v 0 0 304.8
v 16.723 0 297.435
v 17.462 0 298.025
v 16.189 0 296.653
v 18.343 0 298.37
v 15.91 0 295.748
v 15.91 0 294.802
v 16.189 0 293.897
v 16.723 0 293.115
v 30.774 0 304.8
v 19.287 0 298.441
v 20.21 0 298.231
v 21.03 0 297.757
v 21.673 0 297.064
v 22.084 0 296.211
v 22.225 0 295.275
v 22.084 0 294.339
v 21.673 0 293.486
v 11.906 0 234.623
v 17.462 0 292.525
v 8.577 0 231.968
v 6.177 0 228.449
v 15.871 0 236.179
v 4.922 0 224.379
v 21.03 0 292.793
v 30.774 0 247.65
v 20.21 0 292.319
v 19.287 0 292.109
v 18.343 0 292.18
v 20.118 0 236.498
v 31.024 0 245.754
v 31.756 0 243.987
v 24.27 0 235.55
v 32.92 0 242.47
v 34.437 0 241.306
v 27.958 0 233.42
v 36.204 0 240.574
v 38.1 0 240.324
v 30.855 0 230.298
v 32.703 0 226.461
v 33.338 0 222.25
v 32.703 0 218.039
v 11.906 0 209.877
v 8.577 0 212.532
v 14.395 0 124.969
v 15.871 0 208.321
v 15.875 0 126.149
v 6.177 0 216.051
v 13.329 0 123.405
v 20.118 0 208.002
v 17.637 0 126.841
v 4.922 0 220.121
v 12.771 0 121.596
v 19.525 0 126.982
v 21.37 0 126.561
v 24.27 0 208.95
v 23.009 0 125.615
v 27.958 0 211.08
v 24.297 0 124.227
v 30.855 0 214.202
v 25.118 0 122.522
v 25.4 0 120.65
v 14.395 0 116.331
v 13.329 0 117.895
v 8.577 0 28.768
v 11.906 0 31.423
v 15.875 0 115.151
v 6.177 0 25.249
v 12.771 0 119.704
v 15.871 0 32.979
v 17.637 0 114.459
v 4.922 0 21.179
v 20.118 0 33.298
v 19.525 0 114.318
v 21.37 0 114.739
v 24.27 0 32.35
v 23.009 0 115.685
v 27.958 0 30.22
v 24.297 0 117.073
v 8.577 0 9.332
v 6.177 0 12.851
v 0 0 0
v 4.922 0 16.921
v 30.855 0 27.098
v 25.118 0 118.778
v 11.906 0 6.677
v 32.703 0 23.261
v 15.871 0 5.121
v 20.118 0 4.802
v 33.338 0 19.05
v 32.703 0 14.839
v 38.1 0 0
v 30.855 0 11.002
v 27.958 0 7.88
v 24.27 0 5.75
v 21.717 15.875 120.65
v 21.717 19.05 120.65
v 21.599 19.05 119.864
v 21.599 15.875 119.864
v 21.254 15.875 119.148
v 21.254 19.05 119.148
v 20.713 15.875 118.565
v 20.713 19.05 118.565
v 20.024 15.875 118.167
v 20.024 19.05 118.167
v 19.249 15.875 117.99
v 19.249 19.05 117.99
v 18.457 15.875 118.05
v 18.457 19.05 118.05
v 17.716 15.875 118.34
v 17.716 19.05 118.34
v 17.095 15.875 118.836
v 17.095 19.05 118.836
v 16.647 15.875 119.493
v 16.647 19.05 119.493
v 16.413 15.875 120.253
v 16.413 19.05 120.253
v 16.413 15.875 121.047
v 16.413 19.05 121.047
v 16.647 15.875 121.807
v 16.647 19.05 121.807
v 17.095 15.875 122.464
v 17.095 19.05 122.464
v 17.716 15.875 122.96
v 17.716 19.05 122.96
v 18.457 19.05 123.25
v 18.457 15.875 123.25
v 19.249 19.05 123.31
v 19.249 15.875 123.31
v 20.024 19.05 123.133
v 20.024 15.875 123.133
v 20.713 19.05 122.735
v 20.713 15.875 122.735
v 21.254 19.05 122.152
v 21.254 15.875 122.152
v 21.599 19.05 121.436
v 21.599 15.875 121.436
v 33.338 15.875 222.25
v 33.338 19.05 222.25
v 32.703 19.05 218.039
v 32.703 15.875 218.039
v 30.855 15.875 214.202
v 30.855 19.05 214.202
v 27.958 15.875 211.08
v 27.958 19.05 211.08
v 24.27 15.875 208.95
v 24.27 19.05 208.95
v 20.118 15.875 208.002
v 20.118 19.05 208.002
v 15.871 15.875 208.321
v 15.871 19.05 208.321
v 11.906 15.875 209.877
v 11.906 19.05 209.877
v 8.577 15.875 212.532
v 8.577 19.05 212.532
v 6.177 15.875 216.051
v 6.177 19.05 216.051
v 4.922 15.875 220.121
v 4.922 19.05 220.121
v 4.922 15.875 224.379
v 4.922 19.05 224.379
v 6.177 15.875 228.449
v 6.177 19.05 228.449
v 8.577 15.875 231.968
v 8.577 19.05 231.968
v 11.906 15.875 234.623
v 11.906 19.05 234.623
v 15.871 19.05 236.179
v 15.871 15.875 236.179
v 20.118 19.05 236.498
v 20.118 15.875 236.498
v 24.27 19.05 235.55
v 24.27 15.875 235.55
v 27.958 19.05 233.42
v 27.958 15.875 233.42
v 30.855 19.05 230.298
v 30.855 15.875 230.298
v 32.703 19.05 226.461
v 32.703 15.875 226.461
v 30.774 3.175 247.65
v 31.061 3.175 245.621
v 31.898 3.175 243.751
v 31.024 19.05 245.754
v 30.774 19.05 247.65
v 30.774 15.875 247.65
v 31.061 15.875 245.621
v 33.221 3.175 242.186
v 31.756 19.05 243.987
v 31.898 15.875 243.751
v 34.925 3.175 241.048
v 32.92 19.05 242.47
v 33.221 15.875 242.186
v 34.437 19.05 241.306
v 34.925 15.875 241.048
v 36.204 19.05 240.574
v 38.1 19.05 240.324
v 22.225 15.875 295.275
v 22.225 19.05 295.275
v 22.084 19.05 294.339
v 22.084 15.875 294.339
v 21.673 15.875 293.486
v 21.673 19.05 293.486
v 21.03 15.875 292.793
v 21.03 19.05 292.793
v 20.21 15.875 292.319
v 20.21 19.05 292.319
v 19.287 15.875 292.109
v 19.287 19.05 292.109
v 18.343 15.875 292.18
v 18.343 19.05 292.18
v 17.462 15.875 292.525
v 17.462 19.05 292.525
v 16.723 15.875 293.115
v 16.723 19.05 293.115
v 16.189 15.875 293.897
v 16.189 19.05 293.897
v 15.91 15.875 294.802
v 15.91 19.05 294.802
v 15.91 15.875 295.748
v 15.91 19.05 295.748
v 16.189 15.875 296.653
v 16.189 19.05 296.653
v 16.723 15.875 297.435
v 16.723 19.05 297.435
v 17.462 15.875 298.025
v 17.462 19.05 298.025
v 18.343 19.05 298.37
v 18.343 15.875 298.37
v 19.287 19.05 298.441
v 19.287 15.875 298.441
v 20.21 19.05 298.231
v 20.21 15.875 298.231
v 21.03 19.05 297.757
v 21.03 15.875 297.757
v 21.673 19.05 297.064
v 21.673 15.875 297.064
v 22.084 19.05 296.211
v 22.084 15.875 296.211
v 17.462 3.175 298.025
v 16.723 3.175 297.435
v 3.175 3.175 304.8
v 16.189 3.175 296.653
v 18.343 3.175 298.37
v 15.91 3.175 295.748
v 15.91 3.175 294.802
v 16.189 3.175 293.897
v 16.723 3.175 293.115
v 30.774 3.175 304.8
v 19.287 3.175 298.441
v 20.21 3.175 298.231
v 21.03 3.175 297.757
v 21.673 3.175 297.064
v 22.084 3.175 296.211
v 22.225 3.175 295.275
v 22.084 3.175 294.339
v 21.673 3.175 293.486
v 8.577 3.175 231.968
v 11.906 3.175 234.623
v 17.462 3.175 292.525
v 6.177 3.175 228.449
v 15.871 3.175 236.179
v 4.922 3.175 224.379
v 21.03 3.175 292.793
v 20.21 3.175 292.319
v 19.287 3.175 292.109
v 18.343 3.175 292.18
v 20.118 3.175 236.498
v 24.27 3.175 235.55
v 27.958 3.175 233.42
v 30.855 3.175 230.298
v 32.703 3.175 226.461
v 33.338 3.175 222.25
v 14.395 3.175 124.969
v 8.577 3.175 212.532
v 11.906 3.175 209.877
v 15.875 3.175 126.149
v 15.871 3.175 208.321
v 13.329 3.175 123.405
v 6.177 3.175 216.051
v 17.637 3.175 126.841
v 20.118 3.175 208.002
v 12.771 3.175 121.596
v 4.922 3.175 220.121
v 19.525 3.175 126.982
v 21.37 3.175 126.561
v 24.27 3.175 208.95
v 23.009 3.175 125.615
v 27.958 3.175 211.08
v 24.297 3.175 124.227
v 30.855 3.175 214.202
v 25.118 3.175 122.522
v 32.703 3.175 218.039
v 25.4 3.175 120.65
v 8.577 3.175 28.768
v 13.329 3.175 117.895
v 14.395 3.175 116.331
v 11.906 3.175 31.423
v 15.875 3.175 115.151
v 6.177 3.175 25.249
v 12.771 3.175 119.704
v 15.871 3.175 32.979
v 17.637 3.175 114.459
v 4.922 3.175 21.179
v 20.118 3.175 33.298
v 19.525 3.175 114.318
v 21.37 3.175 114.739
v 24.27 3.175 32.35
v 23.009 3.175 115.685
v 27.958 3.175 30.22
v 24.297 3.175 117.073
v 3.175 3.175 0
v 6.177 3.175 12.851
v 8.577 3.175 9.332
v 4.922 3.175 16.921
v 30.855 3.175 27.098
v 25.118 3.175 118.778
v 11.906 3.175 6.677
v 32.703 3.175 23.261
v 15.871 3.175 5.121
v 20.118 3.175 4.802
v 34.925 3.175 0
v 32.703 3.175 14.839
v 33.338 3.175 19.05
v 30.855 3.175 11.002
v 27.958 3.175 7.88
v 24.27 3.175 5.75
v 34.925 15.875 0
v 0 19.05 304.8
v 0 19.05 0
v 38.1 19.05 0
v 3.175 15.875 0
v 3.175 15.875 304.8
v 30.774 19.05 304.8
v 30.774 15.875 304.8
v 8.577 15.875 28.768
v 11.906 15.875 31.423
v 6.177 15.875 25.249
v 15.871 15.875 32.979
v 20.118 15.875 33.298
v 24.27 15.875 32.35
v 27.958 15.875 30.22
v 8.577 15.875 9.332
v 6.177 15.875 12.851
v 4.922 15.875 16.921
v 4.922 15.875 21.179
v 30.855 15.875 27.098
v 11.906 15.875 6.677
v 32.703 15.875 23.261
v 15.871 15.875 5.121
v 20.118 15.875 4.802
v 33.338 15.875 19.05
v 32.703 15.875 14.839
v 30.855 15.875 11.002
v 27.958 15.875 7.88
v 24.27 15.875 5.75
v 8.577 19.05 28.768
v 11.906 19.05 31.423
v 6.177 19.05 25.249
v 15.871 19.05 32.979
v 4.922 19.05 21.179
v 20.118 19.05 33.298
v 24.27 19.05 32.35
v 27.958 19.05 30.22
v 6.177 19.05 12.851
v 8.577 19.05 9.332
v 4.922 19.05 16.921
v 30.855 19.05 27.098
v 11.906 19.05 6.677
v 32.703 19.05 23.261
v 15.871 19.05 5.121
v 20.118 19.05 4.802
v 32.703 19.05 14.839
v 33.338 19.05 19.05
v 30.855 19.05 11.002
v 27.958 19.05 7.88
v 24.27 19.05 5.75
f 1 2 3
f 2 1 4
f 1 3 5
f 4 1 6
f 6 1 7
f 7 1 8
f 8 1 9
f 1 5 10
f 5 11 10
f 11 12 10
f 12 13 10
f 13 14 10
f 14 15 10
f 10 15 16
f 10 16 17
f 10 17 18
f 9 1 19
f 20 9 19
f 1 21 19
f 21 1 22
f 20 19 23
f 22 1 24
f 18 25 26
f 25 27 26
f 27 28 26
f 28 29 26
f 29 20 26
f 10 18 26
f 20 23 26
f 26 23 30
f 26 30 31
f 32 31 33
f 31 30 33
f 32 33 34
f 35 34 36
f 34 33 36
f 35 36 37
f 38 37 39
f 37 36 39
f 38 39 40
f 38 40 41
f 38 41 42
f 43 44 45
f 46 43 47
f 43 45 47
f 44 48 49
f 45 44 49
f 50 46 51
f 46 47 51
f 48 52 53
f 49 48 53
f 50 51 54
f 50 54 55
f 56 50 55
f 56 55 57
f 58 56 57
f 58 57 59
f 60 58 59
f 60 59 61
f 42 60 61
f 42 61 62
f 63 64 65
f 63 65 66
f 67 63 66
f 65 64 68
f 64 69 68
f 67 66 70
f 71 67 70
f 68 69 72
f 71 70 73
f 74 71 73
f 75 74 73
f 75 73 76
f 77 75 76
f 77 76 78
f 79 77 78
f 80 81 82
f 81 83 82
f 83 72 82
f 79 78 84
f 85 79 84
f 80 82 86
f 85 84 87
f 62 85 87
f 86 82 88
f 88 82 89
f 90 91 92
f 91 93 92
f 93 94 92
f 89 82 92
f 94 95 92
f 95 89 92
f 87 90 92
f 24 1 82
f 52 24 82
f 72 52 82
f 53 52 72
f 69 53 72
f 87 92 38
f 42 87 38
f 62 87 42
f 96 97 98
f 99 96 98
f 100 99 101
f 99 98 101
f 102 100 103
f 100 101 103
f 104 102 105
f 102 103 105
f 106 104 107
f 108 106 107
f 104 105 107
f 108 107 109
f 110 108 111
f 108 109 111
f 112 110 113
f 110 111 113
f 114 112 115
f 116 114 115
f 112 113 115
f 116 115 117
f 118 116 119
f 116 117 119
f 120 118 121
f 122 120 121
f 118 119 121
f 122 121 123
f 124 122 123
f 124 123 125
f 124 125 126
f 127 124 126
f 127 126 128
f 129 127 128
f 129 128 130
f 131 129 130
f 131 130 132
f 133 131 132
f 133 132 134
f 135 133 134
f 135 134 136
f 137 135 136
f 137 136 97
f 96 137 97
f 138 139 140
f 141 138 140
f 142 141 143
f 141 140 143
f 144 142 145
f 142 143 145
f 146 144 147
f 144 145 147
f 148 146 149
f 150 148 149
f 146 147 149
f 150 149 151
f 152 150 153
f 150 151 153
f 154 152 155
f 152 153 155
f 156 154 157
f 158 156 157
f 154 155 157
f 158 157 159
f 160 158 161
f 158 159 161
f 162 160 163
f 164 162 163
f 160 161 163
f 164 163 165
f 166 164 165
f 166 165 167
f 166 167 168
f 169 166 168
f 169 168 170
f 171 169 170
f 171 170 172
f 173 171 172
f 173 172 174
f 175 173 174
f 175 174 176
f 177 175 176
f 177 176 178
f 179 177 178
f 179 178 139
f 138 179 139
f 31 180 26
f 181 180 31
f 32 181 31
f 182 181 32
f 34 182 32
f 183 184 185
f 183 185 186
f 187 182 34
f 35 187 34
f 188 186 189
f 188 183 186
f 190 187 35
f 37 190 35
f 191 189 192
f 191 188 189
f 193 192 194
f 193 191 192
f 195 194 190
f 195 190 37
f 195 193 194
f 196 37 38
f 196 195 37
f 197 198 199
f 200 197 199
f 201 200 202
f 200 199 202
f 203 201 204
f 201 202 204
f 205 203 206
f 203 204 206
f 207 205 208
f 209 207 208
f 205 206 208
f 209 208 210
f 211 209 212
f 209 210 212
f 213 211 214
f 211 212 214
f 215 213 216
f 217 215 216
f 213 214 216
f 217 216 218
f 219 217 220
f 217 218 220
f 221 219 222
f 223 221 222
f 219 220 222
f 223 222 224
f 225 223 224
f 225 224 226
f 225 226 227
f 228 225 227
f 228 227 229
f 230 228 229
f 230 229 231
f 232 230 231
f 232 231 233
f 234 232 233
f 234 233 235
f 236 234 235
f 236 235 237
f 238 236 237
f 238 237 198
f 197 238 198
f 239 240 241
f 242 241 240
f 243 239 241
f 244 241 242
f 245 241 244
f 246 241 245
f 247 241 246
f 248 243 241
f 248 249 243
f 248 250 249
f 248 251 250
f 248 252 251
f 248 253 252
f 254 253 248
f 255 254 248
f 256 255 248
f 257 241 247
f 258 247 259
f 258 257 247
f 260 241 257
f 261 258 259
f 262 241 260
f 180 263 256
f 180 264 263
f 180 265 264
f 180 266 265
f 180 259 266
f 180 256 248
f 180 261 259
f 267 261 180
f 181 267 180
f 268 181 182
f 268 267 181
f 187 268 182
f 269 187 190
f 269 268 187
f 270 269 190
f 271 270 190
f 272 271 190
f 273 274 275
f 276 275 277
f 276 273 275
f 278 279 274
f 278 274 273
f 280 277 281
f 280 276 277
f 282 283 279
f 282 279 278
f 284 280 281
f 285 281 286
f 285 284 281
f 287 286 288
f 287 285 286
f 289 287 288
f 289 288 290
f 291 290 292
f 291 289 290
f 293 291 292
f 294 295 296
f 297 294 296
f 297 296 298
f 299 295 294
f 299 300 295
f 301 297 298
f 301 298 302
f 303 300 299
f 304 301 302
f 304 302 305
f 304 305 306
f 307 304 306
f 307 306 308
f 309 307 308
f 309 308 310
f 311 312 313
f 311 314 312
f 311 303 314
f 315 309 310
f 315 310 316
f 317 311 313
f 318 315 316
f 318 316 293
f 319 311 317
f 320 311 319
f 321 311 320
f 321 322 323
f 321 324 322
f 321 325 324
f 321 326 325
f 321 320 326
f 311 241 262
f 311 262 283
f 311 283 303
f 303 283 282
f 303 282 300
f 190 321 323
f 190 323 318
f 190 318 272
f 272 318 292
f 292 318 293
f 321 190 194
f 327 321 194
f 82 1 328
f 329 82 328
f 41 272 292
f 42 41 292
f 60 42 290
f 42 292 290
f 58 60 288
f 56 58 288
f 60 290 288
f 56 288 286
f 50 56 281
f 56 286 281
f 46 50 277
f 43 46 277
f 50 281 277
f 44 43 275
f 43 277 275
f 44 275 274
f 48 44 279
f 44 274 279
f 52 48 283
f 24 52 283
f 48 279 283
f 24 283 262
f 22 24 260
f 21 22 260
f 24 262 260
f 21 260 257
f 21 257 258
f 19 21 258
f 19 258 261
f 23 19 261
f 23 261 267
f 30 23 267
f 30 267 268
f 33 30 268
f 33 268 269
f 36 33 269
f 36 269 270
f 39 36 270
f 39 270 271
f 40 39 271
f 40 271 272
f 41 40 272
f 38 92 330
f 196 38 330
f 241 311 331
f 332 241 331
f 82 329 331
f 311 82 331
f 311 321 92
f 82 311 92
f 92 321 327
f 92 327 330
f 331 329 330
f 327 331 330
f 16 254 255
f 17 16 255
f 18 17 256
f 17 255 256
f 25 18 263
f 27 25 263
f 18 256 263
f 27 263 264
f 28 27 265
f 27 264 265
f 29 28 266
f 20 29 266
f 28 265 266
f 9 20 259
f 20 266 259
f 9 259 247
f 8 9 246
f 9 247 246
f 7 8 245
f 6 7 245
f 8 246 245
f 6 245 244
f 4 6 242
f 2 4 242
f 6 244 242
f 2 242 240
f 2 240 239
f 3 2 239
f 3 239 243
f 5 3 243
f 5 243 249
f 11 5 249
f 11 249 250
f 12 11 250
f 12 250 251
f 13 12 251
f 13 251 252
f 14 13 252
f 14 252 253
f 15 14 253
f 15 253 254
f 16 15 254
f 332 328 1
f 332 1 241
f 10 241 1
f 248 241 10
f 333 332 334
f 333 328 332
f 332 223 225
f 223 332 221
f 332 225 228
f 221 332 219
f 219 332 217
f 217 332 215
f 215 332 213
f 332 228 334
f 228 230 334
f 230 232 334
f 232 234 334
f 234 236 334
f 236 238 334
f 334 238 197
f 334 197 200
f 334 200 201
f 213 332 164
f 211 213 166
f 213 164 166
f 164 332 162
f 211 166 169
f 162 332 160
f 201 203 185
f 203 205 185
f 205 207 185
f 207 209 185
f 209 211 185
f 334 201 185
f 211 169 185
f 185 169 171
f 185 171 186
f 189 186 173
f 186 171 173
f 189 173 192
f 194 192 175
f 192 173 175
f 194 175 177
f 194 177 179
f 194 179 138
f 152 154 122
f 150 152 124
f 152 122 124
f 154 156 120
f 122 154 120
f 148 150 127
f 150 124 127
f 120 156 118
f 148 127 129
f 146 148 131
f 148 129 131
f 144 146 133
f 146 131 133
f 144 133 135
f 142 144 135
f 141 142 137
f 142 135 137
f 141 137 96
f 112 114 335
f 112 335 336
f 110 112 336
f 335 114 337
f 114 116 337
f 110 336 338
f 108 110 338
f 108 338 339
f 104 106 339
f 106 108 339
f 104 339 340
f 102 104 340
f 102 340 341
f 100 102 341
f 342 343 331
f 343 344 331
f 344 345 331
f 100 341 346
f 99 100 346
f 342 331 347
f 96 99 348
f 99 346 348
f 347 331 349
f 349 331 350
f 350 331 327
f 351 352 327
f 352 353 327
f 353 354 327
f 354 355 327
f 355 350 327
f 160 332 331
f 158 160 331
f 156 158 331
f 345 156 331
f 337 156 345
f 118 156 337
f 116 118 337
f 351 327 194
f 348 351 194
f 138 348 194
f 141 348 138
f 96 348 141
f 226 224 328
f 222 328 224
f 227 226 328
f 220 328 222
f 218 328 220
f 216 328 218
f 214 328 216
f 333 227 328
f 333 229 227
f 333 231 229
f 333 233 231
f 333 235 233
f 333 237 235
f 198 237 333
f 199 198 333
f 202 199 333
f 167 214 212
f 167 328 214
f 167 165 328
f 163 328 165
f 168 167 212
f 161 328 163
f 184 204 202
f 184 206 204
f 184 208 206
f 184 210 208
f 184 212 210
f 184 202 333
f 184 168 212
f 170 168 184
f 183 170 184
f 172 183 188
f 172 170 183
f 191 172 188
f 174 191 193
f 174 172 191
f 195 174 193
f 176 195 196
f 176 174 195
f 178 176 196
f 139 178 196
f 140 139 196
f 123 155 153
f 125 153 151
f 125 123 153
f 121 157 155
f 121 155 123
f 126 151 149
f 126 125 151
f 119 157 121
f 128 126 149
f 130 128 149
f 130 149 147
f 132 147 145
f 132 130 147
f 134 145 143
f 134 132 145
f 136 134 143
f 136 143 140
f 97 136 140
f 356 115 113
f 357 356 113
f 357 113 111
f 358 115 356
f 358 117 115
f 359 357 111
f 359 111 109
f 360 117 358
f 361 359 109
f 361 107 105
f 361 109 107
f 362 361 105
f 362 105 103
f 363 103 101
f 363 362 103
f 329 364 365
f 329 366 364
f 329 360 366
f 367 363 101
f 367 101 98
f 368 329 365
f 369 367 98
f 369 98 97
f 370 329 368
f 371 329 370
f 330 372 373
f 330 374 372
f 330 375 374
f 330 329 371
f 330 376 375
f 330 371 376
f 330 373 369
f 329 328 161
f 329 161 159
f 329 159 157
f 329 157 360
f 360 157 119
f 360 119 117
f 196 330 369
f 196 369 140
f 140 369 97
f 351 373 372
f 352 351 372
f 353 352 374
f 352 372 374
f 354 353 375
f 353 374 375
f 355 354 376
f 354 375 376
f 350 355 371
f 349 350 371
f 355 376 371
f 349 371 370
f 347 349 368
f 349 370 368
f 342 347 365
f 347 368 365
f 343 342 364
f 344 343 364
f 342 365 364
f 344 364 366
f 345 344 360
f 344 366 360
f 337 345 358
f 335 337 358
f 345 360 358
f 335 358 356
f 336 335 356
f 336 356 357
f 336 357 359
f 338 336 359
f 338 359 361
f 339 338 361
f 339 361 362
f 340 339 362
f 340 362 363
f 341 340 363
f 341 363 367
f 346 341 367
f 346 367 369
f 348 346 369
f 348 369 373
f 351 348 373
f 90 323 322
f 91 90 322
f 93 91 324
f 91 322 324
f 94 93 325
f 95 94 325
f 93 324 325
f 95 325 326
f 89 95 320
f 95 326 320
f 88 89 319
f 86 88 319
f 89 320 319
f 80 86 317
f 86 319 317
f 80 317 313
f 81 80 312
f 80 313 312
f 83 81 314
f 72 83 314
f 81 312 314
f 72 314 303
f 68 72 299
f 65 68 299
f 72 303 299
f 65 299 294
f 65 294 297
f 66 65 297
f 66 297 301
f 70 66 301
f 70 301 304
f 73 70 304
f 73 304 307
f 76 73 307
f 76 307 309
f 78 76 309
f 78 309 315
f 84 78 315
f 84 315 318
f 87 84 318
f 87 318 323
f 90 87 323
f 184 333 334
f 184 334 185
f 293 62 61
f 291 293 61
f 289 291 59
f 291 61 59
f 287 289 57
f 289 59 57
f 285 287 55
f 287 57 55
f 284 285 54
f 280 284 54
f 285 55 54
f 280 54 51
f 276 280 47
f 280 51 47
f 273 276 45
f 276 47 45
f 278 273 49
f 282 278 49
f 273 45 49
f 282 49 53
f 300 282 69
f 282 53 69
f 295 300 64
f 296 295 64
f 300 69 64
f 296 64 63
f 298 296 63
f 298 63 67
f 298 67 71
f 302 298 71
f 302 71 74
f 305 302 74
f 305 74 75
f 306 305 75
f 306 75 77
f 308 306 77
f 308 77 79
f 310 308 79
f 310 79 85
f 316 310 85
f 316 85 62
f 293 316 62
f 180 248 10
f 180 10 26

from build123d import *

# Parameters (mm, degrees)
SKETCH1_W           = 38.1
SKETCH1_H           = 19.05
SKETCH1_W_2         = 31.75
SKETCH1_H_2         = 12.7
BOSS_EXTRUDE1_DEPTH = 304.8
SKETCH2_R           = 14.2875
CUT_EXTRUDE1_DEPTH  = 20.05
SKETCH3_R           = 3.175
CUT_EXTRUDE2_DEPTH  = 20.05
CUT_EXTRUDE3_DEPTH  = 20.05
SKETCH5_R           = 2.667
CUT_EXTRUDE4_DEPTH  = 20.05
CUT_EXTRUDE5_REACH  = 21.05
SKETCH6_R           = 6.35


with BuildPart() as part:
    # Sketch1 → Boss-Extrude1 (new body)
    with BuildSketch(Plane.XY):
        with Locations((19.05, 9.525)):
            Rectangle(SKETCH1_W, SKETCH1_H)
        with Locations((19.05, 9.525)):
            Rectangle(SKETCH1_W_2, SKETCH1_H_2, mode=Mode.SUBTRACT)
    extrude(amount=BOSS_EXTRUDE1_DEPTH)

    # Sketch2 → Cut-Extrude1 (cut, through all)
    with BuildSketch(Plane(origin=(0, 19.05, 0), x_dir=(1, 0, 0), z_dir=(0, 1, 0))):
        with Locations((19.05, -19.05)):
            Circle(SKETCH2_R)
        with Locations((19.05, -222.25)):
            Circle(SKETCH2_R)
    extrude(amount=-CUT_EXTRUDE1_DEPTH, mode=Mode.SUBTRACT)

    # Sketch3 → Cut-Extrude2 (cut, through all)
    with BuildSketch(Plane(origin=(0, 19.05, 0), x_dir=(1, 0, 0), z_dir=(0, 1, 0))):
        with Locations((19.05, -295.275)):
            Circle(SKETCH3_R)
    extrude(amount=-CUT_EXTRUDE2_DEPTH, mode=Mode.SUBTRACT)

    # Sketch4 → Cut-Extrude3 (cut, through all)
    with BuildSketch(Plane(origin=(0, 19.05, 0), x_dir=(1, 0, 0), z_dir=(0, 1, 0))):
        with BuildLine():
            Line((30.774464213, -304.8), (30.774464213, -247.65))
            ThreePointArc((30.774464213, -247.65), (32.920063969, -242.470063969), (38.1, -240.324464213))
            Line((38.1, -240.324464213), (38.1, -304.8))
            Line((38.1, -304.8), (30.774464213, -304.8))
        make_face()
    extrude(amount=-CUT_EXTRUDE3_DEPTH, mode=Mode.SUBTRACT)

    # Sketch5 → Cut-Extrude4 (cut, through all)
    with BuildSketch(Plane(origin=(0, 19.05, 0), x_dir=(1, 0, 0), z_dir=(0, 1, 0))):
        with Locations((19.05, -120.65)):
            Circle(SKETCH5_R)
    extrude(amount=-CUT_EXTRUDE4_DEPTH, mode=Mode.SUBTRACT)

    # Sketch6 → Cut-Extrude5 (cut, up to next)
    with BuildSketch(Plane.XZ, mode=Mode.PRIVATE) as cut_extrude5_sk1:
        with Locations((19.05, 120.65)):
            Circle(SKETCH6_R)
    cut_extrude5_tool1 = extrude(cut_extrude5_sk1.sketch, amount=-CUT_EXTRUDE5_REACH, mode=Mode.PRIVATE) & part.part
    add(cut_extrude5_tool1.solids().sort_by_distance((19.05, 0, 120.65))[0], mode=Mode.SUBTRACT)


solid = part.part
